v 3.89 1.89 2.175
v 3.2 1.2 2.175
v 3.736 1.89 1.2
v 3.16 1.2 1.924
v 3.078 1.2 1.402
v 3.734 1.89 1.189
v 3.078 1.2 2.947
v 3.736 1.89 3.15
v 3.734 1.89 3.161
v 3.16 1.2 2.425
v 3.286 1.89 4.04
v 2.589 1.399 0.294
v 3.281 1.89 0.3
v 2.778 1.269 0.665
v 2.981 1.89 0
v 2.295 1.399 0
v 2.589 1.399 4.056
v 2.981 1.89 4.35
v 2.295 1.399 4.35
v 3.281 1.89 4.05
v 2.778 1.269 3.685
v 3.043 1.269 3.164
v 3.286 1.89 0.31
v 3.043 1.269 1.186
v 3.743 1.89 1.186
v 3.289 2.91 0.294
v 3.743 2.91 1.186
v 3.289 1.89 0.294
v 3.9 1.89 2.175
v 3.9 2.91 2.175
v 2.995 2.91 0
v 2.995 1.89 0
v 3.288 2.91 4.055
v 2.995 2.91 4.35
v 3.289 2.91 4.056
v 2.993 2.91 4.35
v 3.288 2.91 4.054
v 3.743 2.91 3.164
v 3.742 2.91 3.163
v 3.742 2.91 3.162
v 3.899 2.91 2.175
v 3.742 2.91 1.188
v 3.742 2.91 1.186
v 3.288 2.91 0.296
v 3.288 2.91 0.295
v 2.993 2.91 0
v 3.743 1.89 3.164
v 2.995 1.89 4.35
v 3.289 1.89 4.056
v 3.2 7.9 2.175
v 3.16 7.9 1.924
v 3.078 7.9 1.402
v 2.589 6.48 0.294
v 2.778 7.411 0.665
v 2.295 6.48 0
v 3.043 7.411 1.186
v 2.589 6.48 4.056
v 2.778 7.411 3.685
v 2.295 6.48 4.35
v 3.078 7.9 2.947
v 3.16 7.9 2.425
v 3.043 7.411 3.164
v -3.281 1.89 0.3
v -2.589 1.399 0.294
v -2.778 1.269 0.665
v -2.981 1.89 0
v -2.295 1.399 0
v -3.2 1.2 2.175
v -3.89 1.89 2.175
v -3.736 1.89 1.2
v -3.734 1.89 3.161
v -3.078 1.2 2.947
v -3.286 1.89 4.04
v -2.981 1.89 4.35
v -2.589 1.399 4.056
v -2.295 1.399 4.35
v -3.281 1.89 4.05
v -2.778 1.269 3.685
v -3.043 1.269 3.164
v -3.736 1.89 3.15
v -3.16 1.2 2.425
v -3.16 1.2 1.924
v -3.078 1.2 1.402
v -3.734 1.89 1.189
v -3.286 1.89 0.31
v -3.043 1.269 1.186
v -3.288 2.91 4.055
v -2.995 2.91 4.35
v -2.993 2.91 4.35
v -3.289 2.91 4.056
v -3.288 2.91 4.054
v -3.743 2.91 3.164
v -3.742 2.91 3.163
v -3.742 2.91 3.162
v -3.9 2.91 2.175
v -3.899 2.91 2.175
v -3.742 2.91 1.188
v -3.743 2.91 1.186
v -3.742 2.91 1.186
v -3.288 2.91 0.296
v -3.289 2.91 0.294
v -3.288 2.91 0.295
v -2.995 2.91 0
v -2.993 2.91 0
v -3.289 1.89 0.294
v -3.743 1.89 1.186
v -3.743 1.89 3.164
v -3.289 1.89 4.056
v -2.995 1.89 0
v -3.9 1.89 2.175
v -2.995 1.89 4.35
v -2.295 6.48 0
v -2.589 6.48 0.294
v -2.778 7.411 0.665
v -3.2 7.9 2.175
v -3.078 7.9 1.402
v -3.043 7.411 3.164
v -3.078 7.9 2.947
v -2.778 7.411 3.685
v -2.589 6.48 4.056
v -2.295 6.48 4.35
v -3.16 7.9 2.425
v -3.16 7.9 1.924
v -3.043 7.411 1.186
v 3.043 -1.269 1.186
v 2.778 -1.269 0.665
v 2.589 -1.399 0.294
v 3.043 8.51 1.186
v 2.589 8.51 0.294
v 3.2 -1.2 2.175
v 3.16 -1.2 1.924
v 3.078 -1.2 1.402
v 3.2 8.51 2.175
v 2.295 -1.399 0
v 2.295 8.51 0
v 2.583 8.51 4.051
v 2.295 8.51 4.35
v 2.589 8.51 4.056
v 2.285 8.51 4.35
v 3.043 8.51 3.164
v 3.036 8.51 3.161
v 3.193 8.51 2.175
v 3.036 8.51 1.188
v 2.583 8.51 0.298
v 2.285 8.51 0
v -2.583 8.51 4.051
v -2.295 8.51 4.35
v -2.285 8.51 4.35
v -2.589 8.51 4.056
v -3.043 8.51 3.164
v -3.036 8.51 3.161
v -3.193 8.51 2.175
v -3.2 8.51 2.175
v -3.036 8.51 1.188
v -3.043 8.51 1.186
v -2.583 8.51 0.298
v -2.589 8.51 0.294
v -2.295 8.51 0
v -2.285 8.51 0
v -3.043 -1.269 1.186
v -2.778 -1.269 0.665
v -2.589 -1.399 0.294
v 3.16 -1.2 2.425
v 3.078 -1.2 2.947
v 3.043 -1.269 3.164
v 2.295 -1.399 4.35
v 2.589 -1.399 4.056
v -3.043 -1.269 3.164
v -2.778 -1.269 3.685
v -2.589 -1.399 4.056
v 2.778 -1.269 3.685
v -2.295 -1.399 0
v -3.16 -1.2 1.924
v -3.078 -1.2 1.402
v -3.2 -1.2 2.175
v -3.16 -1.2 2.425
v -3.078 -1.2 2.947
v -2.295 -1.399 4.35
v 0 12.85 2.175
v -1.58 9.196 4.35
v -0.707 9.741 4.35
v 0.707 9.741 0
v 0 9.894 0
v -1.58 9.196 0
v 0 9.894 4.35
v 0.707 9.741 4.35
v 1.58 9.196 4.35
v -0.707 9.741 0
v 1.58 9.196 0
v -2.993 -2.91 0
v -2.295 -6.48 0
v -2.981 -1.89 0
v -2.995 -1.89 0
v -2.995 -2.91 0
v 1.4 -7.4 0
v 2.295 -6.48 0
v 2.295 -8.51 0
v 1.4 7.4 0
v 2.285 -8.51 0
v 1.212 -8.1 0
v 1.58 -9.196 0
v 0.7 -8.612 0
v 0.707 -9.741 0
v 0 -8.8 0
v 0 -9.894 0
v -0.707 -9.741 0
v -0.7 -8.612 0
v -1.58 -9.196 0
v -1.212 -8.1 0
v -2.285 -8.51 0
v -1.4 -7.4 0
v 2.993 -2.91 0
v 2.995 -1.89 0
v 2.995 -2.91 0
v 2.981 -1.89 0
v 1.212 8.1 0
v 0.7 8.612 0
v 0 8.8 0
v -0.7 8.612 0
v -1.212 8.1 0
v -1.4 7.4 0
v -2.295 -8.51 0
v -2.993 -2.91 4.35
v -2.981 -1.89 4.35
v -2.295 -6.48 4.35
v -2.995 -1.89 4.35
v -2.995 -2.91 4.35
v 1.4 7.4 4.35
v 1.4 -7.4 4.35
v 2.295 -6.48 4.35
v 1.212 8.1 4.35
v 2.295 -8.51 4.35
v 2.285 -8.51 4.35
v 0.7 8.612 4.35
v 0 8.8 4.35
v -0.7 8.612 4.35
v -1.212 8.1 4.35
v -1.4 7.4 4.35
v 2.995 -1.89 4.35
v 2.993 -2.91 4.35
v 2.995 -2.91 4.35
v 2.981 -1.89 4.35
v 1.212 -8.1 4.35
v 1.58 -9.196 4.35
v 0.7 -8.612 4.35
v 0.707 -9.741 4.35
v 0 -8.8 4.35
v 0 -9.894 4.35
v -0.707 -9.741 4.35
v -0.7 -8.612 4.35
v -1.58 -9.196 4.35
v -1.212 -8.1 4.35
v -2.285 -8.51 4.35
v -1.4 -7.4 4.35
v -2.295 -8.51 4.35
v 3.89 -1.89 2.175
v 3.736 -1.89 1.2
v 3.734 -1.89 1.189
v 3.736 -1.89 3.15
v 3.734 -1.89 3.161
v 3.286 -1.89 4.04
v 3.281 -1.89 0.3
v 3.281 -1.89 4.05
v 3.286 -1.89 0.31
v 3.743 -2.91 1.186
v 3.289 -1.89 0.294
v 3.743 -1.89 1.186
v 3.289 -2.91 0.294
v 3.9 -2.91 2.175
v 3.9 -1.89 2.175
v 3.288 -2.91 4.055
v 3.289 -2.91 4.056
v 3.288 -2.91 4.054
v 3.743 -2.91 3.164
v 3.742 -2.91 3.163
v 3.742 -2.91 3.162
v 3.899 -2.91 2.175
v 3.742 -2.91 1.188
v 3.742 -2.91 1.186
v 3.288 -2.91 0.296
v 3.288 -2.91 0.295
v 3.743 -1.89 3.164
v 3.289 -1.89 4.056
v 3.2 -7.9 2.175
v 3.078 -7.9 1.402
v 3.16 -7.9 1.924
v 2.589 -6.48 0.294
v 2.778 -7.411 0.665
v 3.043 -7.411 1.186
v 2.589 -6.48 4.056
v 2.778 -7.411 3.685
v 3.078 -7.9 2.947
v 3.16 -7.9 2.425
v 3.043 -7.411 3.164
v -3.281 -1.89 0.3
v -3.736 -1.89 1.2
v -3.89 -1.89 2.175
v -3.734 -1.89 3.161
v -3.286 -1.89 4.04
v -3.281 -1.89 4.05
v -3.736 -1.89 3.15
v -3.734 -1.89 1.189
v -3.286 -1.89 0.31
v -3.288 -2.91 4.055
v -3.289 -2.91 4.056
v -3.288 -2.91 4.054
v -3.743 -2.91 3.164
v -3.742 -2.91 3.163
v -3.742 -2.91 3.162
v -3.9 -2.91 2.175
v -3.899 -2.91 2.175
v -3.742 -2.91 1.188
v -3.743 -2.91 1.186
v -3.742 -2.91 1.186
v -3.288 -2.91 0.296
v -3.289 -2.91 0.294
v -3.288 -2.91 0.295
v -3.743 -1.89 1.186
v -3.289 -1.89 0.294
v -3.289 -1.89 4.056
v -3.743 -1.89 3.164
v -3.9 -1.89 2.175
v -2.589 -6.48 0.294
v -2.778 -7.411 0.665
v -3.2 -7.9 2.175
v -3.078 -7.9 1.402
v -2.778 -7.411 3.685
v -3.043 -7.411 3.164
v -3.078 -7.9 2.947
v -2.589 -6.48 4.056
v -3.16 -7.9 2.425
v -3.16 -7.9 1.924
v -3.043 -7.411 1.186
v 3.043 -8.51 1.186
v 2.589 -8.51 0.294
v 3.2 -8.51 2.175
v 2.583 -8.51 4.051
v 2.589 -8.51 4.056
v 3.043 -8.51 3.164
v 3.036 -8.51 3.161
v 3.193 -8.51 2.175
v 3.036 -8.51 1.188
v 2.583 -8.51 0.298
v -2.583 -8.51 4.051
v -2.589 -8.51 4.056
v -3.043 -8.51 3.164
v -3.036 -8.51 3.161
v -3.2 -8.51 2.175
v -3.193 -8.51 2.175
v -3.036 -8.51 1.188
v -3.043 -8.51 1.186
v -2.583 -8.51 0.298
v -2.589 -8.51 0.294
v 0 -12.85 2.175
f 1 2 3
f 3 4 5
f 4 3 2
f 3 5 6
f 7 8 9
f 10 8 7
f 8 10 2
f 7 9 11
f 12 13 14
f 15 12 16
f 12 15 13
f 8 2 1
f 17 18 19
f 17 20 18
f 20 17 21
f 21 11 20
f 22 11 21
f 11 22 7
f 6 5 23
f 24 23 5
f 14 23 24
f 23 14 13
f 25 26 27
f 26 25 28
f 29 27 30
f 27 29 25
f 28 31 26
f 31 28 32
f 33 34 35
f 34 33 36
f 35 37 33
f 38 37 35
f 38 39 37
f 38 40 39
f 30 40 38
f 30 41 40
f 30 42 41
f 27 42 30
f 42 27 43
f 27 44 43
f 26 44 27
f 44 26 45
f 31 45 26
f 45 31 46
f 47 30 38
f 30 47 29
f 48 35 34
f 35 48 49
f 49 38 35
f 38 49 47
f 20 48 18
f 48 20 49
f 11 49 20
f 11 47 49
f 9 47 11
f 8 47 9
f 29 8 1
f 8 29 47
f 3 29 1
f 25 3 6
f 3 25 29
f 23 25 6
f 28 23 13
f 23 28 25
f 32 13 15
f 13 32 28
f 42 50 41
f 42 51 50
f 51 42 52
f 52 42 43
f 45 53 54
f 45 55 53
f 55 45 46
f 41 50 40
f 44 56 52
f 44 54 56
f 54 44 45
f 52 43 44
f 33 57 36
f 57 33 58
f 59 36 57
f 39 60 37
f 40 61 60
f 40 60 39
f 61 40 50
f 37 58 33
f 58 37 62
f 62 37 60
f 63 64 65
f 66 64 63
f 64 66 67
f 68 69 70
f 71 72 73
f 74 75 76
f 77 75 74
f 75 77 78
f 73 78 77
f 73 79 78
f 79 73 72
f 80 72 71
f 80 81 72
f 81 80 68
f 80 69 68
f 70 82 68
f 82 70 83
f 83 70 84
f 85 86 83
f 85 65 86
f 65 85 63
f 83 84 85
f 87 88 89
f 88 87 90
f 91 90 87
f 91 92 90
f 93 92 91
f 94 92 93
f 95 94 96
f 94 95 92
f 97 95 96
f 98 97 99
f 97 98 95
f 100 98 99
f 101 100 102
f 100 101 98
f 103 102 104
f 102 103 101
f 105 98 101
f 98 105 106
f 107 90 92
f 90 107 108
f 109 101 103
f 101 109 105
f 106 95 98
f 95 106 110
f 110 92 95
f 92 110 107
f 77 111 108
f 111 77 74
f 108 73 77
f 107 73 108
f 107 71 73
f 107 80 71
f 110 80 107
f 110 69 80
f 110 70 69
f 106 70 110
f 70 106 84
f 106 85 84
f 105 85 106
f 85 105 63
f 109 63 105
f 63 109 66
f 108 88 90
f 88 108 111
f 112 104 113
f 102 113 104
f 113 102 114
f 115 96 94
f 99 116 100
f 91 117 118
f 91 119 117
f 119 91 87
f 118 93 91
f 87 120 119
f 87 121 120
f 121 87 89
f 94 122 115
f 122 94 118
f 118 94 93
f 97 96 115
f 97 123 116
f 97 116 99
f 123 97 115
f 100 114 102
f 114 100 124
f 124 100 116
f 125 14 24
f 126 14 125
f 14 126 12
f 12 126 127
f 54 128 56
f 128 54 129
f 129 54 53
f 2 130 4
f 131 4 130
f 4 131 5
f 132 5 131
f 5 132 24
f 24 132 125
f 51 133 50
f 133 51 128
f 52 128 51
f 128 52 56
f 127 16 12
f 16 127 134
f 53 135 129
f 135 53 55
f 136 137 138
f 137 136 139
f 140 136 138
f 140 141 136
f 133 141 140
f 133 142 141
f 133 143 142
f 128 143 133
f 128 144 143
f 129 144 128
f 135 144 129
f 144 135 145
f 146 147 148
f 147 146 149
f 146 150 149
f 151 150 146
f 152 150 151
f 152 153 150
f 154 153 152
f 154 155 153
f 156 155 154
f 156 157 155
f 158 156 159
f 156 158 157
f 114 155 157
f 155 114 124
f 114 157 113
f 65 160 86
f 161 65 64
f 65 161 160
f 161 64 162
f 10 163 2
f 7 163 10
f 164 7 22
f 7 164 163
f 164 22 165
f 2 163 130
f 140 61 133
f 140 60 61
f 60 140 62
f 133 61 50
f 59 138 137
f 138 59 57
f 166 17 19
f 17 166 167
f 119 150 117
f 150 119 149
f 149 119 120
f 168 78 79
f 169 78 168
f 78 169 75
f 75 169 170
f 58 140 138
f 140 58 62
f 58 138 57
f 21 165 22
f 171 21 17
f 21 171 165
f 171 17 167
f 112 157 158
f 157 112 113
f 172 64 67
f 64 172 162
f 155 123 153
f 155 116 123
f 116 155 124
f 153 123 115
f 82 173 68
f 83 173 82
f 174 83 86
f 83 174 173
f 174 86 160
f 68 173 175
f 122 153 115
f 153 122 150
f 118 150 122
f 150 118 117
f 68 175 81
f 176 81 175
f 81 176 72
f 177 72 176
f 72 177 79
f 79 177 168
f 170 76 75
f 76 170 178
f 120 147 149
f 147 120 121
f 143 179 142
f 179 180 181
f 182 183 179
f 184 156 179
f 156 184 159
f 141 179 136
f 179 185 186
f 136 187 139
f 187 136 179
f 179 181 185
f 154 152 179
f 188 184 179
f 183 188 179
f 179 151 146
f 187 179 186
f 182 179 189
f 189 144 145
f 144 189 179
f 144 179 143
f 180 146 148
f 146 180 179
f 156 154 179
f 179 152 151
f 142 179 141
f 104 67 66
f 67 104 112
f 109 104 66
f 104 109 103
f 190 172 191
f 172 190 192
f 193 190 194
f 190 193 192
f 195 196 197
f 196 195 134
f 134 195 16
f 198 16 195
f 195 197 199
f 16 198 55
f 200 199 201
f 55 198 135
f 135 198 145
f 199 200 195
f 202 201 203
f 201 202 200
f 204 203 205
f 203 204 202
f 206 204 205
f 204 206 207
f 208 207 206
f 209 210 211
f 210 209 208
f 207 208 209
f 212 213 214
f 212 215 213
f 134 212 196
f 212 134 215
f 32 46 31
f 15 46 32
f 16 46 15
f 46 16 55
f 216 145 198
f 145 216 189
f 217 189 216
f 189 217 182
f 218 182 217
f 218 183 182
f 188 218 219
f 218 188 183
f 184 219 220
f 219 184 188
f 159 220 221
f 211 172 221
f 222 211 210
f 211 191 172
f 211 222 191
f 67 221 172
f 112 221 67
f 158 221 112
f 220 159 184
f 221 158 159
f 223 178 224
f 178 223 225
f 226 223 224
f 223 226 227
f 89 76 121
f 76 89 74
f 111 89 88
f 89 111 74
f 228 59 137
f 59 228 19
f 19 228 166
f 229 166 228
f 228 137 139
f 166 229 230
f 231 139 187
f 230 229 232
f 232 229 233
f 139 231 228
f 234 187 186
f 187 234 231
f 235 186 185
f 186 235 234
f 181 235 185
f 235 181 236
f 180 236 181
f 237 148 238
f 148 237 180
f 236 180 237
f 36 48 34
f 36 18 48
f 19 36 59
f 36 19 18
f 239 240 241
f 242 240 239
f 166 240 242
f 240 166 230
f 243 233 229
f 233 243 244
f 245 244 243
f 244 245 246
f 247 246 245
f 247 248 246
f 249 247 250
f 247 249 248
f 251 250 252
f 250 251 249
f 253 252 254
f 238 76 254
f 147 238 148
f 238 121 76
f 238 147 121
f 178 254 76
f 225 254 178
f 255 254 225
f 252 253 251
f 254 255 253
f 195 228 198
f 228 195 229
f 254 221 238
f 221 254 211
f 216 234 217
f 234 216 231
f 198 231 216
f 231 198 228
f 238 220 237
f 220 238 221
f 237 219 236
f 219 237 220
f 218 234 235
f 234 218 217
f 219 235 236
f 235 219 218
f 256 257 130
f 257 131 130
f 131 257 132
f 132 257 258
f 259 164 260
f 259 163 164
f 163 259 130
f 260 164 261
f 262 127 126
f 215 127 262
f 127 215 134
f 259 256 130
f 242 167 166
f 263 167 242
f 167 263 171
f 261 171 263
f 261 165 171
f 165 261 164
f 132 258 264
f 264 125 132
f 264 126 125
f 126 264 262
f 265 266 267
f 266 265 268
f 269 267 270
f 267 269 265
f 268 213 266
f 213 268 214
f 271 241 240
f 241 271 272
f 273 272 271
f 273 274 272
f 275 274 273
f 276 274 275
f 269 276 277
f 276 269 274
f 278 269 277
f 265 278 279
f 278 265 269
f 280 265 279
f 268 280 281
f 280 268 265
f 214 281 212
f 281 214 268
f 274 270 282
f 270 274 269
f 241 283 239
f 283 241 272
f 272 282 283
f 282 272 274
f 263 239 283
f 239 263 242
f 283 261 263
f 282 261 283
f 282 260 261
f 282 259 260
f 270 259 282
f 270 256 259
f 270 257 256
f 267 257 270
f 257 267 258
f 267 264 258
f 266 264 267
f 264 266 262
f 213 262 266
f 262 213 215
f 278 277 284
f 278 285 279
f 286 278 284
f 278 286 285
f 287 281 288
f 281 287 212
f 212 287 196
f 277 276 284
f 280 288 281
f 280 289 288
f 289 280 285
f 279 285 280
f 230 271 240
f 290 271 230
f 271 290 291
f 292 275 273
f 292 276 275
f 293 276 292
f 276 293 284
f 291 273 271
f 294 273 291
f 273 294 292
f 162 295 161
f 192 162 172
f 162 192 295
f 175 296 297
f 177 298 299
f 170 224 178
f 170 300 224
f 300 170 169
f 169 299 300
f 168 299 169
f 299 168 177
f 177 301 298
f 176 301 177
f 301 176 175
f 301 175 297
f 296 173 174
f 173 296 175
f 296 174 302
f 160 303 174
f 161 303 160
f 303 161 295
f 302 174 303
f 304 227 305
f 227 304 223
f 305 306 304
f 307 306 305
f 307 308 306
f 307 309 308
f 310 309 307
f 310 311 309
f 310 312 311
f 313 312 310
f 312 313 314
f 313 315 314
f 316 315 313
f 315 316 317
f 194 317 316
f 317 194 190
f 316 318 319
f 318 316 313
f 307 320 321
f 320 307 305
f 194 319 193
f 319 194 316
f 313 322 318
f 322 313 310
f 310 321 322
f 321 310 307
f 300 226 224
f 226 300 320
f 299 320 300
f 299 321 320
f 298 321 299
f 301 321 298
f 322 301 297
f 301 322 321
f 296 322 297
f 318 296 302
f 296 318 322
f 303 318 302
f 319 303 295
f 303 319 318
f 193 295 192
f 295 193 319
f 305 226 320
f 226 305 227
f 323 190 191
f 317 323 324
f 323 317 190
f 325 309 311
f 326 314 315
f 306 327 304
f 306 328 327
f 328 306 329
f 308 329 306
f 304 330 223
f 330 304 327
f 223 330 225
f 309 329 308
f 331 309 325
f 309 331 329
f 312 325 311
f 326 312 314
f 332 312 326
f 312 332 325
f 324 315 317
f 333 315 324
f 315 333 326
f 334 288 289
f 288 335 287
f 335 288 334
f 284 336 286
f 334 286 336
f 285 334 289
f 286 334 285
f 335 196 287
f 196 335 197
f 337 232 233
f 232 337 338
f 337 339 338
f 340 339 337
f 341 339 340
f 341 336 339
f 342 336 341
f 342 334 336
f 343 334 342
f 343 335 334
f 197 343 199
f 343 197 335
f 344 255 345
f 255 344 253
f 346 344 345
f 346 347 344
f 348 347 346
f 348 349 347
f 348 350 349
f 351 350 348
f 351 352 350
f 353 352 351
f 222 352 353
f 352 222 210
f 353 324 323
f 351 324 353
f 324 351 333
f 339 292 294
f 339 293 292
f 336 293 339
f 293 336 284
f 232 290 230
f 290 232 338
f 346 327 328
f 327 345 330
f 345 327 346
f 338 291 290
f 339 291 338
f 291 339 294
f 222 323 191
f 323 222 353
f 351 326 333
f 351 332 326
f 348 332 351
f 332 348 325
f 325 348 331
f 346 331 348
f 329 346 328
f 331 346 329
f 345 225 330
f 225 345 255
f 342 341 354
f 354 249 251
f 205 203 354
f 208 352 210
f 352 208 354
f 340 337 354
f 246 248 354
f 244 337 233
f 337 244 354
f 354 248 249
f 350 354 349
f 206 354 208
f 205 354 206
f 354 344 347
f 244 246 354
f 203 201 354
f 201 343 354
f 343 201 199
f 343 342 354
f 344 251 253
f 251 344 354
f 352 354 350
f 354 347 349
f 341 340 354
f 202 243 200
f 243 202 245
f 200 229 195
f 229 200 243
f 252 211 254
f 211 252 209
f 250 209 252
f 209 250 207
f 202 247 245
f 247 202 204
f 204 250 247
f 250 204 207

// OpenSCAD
// new pin connectors

object=0;//[0:Pinpeg,1:Pinhole]
//Pinpeg is twice this length
length=13;
//Of hole; pinpeg is smaller to fit
diameter=7;
//Only affects pinhole
hole_twist=0;//[0:free,1:fixed]
//Pulls the snaps together on the pinpeg to ensure a tight coupling
preload=0.1;
//Allows pins to fit easily into holes
clearance=0.3;
//Thicker makes the pinpeg stiffer
thickness=1.8;
//Height of snap nubs
snap=0.4;
//Put fins on pinhole to help with printing strength
fins=1;//[1:yes,0:no]

$fn=20;

if(object==0)pinpeg(r=diameter/2,l=length,d=2.5-preload,nub=snap,t=thickness,space=clearance);
if(object==1)pinhole(r=diameter/2,l=length,nub=snap,fixed=hole_twist,fins=fins);

//pin(flat=0);
//%pinhole(fixed=true);

//pinpeg();
//translate([10,0,0])difference(){
//	cylinder(r=5.5,h=14);
//	pinhole(fixed=true);
//}
//translate([-10,0,0])difference(){
//	cylinder(r=5.5,h=14);
//	pinhole(fixed=false);
//}

module pin(r=3.5,l=13,d=2.4,slot=10,nub=0.4,t=1.8,space=0.3,flat=1)
translate(flat*[0,0,r/sqrt(2)-space])rotate((1-flat)*[90,0,0])
difference(){
	rotate([-90,0,0])intersection(){
		union(){
			translate([0,0,-0.01])cylinder(r=r-space,h=l-r-0.98);
			translate([0,0,l-r-1])cylinder(r1=r-space,r2=0,h=r-space/2+1);
			translate([nub+space,0,d])nub(r-space,nub+space);
			translate([-nub-space,0,d])nub(r-space,nub+space);
		}
		cube([3*r,r*sqrt(2)-2*space,2*l+3*r],center=true);
	}
	translate([0,d,0])cube([2*(r-t-space),slot,2*r],center=true);
	translate([0,d-slot/2,0])cylinder(r=r-t-space,h=2*r,center=true,$fn=12);
	translate([0,d+slot/2,0])cylinder(r=r-t-space,h=2*r,center=true,$fn=12);
}

module nub(r,nub)
union(){
	translate([0,0,-nub-0.5])cylinder(r1=r-nub,r2=r,h=nub);
	cylinder(r=r,h=1.02,center=true);
	translate([0,0,0.5])cylinder(r1=r,r2=r-nub,h=5);
}

module pinhole(r=3.5,l=13,d=2.5,nub=0.4,fixed=false,fins=true)
intersection(){
	union(){
		translate([0,0,-0.1])cylinder(r=r,h=l-r+0.1);
		translate([0,0,l-r-0.01])cylinder(r1=r,r2=0,h=r);
		translate([0,0,d])nub(r+nub,nub);
		if(fins)translate([0,0,l-r]){
			cube([2*r,0.01,2*r],center=true);
			cube([0.01,2*r,2*r],center=true);
		}
	}
	if(fixed)cube([3*r,r*sqrt(2),2*l+3*r],center=true);
}

module pinpeg(r=3.5,l=13,d=2.4,nub=0.4,t=1.8,space=0.3)
union(){
	pin(r=r,l=l,d=d,nub=nub,t=t,space=space,flat=1);
	mirror([0,1,0])pin(r=r,l=l,d=d,nub=nub,t=t,space=space,flat=1);
}
